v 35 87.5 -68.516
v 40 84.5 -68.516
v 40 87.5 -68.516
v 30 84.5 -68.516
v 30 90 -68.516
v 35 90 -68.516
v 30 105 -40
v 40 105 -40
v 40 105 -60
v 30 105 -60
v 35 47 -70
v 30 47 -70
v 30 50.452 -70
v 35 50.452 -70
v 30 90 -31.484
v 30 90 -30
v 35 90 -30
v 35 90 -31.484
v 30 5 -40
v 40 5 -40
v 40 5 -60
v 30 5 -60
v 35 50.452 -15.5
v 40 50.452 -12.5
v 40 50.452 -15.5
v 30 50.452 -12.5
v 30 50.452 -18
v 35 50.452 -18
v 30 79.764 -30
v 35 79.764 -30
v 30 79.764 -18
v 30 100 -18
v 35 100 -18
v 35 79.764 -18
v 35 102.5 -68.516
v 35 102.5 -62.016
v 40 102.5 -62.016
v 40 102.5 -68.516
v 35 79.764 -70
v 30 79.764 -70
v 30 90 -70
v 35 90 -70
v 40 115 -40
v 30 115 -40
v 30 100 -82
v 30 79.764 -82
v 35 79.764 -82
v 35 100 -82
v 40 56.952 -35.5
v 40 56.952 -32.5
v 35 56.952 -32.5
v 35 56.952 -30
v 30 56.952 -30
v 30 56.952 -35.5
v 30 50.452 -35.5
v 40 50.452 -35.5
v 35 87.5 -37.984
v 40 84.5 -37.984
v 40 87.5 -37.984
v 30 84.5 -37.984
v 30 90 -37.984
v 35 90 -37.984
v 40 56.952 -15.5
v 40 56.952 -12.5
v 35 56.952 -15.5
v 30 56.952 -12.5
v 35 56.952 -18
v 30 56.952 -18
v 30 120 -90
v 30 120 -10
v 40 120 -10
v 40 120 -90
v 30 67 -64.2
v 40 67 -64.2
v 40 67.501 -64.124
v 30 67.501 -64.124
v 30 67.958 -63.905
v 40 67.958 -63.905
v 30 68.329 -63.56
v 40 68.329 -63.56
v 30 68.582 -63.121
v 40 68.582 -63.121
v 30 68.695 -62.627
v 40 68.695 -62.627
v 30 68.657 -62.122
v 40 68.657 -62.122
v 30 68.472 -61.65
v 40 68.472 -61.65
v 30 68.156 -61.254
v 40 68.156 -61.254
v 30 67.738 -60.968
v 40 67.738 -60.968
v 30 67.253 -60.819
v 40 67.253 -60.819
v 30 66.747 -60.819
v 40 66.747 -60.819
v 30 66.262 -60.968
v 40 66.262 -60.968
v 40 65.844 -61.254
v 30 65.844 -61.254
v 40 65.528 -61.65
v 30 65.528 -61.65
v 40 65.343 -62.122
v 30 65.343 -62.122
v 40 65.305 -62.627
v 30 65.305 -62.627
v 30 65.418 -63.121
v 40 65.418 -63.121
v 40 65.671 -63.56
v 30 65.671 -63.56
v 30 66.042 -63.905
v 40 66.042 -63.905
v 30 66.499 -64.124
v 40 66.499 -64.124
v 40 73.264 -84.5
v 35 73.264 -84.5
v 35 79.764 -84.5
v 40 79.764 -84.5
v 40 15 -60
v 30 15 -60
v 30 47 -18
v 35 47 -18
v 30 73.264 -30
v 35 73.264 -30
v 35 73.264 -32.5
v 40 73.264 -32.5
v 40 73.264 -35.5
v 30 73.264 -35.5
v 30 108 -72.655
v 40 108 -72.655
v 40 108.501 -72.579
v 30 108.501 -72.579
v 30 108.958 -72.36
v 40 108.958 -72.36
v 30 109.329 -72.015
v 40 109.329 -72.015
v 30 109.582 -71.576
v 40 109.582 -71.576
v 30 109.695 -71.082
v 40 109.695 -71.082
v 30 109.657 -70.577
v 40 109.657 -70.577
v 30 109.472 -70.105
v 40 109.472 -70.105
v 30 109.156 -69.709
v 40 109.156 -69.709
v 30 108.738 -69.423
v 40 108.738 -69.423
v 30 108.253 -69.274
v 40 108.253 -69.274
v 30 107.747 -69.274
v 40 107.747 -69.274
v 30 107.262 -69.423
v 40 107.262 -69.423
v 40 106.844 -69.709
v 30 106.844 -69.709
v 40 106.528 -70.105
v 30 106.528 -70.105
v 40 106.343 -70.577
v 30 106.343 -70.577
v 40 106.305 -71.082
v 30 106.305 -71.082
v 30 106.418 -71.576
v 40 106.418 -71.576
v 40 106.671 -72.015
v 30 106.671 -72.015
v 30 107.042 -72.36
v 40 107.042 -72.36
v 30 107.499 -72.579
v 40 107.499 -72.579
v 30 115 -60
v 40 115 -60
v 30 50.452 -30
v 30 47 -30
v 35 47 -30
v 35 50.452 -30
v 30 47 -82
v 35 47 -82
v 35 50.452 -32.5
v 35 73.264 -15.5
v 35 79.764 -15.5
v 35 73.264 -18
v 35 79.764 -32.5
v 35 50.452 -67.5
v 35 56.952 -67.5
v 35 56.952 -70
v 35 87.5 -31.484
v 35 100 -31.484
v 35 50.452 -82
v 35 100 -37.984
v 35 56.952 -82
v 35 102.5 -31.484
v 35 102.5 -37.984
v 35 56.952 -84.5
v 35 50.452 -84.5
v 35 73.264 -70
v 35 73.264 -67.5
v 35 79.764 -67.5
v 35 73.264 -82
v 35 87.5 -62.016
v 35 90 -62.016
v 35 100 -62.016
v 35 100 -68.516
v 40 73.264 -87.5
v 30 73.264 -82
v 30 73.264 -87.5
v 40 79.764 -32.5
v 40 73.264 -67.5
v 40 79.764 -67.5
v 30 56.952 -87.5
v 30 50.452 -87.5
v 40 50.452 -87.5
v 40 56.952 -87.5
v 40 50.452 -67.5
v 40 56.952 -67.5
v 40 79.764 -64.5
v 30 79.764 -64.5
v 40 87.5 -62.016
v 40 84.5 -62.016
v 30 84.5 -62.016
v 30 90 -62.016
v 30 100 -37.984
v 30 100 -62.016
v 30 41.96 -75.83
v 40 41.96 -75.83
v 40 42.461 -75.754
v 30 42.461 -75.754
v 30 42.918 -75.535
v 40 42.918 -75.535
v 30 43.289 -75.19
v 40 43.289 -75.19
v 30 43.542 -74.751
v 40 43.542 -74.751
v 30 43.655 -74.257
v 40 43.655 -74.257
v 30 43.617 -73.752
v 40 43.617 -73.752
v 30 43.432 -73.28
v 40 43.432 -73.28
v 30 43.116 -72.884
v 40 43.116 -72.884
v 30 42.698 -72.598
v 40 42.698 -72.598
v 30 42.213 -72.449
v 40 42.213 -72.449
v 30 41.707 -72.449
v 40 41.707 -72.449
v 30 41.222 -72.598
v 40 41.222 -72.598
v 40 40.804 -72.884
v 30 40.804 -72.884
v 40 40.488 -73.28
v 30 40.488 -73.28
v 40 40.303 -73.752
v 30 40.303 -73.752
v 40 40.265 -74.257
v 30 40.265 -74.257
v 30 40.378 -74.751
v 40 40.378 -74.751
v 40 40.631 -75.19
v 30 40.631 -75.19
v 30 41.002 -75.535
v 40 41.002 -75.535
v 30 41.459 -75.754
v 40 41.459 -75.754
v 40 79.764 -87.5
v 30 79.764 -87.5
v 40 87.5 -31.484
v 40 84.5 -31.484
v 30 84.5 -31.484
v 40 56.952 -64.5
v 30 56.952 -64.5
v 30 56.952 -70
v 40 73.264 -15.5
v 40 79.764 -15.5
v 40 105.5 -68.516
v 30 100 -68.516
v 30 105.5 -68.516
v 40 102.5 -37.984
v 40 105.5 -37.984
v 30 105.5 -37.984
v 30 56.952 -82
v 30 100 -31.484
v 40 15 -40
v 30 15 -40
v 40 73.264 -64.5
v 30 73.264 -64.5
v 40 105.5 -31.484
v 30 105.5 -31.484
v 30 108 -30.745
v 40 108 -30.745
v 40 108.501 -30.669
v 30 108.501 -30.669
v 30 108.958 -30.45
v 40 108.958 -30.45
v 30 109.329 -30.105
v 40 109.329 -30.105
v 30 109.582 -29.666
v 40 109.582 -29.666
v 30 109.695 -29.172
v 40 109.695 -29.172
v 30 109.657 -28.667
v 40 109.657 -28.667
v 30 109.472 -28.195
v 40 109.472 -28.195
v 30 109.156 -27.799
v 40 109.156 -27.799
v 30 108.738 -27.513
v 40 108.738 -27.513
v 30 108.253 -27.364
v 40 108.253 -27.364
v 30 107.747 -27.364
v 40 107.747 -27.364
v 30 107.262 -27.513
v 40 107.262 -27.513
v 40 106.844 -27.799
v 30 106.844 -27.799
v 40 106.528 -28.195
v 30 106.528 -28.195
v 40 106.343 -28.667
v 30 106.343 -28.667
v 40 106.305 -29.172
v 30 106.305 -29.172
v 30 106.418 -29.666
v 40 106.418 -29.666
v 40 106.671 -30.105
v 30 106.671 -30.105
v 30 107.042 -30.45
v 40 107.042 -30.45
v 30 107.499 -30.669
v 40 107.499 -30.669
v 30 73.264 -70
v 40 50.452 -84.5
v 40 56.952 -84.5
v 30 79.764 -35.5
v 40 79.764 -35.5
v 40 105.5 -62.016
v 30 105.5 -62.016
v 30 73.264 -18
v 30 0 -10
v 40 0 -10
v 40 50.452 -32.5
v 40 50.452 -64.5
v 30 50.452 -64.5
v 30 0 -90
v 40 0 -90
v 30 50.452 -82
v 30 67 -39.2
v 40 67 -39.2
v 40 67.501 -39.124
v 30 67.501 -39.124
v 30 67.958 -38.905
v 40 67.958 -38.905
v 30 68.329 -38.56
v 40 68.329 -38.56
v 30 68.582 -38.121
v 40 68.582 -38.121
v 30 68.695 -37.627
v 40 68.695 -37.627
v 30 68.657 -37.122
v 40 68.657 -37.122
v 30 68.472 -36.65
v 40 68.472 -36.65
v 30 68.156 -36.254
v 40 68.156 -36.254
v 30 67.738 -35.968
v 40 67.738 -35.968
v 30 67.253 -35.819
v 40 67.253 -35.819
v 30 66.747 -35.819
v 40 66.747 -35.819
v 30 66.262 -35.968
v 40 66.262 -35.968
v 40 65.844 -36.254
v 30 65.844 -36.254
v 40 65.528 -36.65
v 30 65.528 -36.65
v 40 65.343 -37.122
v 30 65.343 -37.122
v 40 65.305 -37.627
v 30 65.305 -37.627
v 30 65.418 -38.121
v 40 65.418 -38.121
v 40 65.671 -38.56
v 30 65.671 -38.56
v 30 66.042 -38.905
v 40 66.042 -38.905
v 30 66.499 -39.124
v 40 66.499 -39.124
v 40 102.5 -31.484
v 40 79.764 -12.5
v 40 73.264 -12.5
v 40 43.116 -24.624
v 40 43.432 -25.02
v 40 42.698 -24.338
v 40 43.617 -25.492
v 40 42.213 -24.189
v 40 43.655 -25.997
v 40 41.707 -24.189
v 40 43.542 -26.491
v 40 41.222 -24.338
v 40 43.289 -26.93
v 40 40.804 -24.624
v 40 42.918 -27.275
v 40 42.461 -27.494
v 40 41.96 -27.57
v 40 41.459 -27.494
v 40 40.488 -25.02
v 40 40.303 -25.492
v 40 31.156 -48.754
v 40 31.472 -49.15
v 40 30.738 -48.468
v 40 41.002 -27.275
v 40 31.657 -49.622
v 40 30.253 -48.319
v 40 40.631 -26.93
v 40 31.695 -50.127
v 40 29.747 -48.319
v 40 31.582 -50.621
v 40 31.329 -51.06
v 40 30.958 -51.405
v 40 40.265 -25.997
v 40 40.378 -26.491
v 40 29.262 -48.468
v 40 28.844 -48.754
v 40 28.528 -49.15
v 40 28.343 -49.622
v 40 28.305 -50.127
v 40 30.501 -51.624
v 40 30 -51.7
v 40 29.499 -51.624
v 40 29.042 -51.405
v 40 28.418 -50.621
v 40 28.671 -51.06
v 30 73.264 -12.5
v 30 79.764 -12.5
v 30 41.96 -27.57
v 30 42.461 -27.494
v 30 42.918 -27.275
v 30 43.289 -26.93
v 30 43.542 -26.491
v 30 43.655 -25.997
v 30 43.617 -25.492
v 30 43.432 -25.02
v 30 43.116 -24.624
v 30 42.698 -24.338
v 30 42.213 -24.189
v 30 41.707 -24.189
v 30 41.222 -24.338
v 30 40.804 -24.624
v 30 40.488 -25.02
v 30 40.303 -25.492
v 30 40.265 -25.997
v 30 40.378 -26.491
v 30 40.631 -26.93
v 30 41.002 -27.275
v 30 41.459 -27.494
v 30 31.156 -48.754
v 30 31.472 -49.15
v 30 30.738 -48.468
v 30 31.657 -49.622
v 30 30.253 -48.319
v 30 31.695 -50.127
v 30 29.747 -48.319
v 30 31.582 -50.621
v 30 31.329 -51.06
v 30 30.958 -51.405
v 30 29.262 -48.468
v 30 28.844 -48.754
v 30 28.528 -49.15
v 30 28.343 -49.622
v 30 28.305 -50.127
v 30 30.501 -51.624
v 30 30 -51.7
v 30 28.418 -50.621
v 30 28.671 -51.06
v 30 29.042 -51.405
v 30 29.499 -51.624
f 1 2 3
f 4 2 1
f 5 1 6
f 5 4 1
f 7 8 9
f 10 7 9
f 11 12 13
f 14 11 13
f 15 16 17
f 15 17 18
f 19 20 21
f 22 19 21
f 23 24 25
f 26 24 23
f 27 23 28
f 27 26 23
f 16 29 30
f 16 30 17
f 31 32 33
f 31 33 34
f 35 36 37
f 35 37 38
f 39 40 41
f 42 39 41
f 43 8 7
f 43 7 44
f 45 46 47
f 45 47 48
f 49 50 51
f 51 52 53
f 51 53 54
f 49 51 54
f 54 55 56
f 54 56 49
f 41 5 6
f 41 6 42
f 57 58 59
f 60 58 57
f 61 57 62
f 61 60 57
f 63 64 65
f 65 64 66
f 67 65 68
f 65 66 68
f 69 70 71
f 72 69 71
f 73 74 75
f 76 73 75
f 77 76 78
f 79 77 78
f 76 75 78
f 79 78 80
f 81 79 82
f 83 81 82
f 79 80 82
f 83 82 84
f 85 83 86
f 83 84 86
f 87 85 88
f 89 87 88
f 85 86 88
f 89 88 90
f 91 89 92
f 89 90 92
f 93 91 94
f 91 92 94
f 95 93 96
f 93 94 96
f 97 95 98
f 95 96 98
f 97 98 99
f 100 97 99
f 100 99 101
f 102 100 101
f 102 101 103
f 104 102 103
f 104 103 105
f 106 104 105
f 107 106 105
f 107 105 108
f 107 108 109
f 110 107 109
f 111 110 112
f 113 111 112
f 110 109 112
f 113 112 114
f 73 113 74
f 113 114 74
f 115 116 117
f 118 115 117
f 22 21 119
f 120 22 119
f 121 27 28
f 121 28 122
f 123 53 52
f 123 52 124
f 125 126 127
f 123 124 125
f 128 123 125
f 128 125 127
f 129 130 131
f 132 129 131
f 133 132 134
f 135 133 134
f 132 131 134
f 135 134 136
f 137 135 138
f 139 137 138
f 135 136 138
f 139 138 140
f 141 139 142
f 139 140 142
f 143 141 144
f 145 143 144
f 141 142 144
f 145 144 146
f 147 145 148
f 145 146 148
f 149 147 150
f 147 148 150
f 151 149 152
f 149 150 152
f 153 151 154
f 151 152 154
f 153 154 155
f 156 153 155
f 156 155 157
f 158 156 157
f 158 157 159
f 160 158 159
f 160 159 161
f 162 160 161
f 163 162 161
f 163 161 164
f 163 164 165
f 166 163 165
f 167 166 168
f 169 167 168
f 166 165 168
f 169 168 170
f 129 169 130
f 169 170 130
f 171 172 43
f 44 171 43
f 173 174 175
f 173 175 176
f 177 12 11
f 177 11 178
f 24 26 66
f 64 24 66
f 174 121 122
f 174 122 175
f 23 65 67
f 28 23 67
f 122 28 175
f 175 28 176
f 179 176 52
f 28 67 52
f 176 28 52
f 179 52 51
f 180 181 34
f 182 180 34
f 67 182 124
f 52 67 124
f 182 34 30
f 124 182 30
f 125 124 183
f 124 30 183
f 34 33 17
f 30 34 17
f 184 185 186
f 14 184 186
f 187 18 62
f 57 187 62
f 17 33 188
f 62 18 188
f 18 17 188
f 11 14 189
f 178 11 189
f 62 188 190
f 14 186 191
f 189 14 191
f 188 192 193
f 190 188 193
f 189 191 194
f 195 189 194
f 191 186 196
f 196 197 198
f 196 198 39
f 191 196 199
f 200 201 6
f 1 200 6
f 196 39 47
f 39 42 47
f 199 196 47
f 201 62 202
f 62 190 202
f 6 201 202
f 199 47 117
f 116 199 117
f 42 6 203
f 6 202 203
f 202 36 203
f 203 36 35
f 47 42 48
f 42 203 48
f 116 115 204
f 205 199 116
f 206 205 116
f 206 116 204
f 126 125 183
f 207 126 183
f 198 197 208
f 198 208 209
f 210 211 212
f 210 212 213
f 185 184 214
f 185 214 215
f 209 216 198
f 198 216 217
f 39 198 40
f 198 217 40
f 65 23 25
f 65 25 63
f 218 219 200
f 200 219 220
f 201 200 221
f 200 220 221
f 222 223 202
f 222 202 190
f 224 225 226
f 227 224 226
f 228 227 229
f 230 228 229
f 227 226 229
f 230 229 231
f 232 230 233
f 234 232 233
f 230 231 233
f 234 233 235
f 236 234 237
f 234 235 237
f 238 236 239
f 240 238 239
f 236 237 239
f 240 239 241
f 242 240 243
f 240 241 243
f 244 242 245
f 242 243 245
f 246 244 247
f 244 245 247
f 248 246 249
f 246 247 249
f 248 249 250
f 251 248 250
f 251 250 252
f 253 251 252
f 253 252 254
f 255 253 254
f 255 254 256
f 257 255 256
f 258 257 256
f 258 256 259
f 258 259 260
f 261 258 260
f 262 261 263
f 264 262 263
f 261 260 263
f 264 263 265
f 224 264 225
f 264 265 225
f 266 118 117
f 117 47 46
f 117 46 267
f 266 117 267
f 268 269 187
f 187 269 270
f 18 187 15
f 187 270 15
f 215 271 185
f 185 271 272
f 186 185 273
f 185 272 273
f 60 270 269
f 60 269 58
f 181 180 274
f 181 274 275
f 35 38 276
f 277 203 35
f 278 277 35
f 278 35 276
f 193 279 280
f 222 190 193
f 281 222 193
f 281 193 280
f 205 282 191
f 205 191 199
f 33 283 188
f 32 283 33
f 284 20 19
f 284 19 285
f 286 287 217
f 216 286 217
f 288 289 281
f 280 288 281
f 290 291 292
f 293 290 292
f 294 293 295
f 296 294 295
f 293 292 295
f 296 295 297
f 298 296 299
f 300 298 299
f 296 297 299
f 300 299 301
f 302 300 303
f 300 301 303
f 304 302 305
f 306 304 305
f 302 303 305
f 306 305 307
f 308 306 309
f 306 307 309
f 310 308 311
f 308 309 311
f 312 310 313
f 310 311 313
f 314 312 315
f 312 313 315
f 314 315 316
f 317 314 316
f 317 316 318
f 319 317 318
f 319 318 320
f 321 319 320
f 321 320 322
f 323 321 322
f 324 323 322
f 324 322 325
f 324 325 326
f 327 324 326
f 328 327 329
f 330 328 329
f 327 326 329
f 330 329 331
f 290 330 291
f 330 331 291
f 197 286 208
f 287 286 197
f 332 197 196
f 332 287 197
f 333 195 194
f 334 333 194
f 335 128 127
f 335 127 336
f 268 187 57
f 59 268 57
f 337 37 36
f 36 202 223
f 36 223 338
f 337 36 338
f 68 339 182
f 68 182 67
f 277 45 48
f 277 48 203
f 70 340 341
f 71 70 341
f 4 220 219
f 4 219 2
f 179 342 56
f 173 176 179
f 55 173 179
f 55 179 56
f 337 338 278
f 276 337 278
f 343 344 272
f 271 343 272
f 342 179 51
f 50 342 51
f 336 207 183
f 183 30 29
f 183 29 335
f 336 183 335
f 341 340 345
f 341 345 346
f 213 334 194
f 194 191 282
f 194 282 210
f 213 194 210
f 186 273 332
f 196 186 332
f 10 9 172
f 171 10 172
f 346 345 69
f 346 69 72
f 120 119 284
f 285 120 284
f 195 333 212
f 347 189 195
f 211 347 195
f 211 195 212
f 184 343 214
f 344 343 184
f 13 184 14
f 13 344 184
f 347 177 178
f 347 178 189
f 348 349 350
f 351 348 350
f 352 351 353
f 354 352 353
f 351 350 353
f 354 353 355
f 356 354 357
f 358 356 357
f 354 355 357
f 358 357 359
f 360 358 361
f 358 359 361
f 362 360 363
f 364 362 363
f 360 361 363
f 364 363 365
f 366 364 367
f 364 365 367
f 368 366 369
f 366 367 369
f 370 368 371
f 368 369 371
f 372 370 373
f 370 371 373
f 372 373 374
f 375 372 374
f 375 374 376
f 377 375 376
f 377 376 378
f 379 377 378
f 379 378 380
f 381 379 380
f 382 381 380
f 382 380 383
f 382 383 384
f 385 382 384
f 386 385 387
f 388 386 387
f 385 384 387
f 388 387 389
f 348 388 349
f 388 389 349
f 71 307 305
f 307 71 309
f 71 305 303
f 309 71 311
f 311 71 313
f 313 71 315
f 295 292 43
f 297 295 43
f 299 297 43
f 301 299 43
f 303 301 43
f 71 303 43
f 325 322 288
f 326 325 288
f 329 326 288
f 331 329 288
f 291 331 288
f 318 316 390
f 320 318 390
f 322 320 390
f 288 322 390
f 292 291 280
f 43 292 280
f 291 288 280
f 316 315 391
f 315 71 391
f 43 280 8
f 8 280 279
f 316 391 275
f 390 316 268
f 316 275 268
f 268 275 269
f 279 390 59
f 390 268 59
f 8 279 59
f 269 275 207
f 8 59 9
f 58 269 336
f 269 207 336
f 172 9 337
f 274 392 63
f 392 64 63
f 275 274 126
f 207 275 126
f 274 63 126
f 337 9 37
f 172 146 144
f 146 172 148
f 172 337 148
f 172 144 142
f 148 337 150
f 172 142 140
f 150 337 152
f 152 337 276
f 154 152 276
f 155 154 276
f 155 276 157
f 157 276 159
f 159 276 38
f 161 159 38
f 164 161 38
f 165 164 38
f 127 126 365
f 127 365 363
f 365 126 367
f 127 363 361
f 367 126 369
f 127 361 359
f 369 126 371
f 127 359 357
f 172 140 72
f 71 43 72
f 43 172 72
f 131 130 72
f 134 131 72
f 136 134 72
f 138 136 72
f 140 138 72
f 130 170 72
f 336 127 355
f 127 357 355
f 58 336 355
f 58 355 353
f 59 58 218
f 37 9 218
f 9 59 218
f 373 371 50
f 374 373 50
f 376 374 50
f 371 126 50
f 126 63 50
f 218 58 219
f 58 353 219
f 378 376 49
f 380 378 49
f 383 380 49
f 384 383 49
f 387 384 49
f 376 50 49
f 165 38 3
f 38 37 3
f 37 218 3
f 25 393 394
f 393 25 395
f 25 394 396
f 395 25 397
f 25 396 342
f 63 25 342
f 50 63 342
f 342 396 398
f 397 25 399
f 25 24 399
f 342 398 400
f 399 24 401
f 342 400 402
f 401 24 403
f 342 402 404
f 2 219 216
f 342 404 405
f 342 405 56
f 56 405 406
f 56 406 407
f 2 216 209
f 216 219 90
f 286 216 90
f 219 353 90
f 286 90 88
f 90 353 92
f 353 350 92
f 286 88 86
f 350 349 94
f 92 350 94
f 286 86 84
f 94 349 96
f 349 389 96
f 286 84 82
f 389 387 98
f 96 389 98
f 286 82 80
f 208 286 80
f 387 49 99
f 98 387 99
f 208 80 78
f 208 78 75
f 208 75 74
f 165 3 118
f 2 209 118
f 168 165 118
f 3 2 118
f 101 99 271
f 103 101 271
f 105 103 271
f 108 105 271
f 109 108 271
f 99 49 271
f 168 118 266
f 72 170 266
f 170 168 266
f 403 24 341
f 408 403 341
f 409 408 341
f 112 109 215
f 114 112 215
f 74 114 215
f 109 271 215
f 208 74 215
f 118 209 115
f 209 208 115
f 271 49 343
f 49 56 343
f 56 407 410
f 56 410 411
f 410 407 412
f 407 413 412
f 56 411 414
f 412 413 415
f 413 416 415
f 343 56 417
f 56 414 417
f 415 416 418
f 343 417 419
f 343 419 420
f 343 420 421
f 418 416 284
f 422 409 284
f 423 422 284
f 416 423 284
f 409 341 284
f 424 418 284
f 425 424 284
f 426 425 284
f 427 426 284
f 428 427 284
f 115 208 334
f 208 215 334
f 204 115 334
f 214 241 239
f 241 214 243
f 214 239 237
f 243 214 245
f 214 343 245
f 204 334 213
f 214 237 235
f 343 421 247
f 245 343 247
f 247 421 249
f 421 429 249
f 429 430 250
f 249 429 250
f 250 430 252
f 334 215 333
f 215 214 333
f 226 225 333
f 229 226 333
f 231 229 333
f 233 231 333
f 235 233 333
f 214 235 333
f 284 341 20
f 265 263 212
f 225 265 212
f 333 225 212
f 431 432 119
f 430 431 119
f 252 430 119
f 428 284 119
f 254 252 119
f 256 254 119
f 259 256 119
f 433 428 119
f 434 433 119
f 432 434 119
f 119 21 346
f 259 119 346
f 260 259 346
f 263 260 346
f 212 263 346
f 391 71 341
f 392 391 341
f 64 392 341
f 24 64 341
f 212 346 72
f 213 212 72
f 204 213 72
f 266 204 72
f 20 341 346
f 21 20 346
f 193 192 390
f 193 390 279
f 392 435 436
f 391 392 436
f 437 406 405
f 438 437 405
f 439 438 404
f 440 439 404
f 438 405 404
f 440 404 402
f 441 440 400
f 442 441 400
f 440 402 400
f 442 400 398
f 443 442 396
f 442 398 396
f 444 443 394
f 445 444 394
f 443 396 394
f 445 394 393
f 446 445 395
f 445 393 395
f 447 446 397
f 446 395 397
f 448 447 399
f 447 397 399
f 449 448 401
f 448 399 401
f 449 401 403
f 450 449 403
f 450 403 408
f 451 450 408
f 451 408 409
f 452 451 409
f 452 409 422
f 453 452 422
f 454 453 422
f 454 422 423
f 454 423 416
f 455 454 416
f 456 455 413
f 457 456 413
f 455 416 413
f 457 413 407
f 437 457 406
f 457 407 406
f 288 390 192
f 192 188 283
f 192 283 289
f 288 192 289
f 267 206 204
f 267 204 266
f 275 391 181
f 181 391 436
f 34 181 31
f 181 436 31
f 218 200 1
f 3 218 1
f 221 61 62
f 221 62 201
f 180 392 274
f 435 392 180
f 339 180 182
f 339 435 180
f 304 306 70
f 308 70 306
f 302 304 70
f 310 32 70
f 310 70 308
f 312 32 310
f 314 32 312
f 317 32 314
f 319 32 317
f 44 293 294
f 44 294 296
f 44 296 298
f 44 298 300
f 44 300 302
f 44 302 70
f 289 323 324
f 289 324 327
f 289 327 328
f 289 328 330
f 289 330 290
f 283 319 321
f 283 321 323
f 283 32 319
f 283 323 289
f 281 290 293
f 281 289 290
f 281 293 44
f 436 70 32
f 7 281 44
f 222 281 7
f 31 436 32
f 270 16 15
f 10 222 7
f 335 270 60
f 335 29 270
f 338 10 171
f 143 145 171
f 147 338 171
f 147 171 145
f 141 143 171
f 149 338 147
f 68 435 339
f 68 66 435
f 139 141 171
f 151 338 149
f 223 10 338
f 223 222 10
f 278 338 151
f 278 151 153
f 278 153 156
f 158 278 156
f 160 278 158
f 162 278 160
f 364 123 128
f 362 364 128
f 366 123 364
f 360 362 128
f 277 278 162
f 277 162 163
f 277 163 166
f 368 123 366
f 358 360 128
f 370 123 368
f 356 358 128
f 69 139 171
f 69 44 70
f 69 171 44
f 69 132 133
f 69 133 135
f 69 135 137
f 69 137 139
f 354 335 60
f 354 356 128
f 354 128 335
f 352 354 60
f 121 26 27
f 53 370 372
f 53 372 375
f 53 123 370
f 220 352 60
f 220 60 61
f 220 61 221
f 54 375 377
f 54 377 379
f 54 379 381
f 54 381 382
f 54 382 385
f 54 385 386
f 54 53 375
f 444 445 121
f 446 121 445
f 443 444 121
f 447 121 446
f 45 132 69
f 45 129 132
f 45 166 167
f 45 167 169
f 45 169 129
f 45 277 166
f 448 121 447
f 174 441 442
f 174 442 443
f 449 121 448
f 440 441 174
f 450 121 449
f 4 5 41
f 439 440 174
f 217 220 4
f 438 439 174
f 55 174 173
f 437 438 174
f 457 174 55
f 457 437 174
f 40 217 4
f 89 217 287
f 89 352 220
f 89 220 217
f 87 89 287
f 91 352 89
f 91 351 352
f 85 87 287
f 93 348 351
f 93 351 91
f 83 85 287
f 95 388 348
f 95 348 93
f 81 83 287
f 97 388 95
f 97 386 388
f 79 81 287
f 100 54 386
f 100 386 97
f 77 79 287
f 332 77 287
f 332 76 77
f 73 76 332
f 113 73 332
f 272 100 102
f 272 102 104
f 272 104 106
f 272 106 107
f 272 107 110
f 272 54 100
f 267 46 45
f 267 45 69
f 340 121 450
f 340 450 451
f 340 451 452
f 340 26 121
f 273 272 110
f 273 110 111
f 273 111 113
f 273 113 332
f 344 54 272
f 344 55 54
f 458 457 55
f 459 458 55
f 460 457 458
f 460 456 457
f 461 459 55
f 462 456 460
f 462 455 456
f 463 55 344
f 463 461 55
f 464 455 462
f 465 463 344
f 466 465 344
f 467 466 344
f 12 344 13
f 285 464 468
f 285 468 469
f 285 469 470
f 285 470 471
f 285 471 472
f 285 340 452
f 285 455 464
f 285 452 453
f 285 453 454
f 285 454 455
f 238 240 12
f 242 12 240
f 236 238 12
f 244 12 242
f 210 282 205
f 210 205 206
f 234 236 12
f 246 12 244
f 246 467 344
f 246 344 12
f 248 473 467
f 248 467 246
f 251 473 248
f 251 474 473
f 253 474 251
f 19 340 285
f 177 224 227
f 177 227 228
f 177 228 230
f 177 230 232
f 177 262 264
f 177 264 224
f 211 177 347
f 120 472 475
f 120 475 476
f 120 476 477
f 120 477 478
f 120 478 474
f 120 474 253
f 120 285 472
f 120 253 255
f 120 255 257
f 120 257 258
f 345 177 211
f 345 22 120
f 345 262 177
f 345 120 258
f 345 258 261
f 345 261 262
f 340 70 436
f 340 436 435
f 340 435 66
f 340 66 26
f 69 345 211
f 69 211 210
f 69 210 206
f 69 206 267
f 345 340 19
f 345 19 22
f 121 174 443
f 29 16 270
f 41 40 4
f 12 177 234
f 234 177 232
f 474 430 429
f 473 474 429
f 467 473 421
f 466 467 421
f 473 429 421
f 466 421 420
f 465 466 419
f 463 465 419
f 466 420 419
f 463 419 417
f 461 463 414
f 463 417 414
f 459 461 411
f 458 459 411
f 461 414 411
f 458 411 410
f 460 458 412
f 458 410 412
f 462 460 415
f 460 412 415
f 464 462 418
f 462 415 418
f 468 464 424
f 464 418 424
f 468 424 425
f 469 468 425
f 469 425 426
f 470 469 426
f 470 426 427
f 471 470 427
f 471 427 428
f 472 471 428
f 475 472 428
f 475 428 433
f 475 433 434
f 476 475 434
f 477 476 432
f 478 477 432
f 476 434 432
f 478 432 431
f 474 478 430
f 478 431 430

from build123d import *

# Parameters (mm, degrees)
SKETCH3_W                = 100
SKETCH3_H                = 100
SKETCH3_W_2              = 80
SKETCH3_H_2              = 80
BOSS_EXTRUDE1_DEPTH      = 120
CUT_EXTRUDE6_DEPTH       = 186.47236991
CIRPATTERN1_COUNT        = 2
CIRPATTERN1_ANGLE        = 90
SKETCH19_R               = 13.375
SKETCH19_R_2             = 8.4375
BOSS_EXTRUDE3_DEPTH      = 10
BOSS_EXTRUDE4_START      = -110
SKETCH19_2_R             = 13.375
SKETCH19_2_R_2           = 8.4375
BOSS_EXTRUDE4_DEPTH      = 10
CUT_EXTRUDE4_DEPTH       = 186.47236991
CUT_EXTRUDE4_DEPTH_BACK  = 186.47236991
SKETCH8_R                = 8.4375
CUT_EXTRUDE11_START      = 120
SKETCH21_R               = 1.5
CUT_EXTRUDE11_DEPTH      = 10
CUT_EXTRUDE12_START      = 10
SKETCH21_2_R             = 1.5
CUT_EXTRUDE12_DEPTH      = 10
SKETCH9_W                = 10
SKETCH9_H                = 80
ELECTRONICSPLATE_DEPTH   = 120
CUT_EXTRUDE10_REACH      = 187.472
SKETCH18_W               = 80
SKETCH18_H               = 100
BEAGLEBONEHOLES_START    = 40
SKETCH12_R               = 1.7
BEAGLEBONEHOLES_DEPTH    = 10
RFDHOLES_START           = 40
SKETCH13_R               = 1.7
RFDHOLES_DEPTH           = 10
ANTENNACAVITY_START      = 30
SKETCH35_W               = 12
SKETCH35_H               = 43
ANTENNACAVITY_DEPTH      = 5
ZIPTIEHOLES_START        = 30
SKETCH36_W               = 3
SKETCH36_H               = 6.5
SKETCH36_W_2             = 6.5
SKETCH36_H_2             = 3
ZIPTIEHOLES_DEPTH        = 10
CUT_EXTRUDE16_START      = 30
SKETCH36_3_W             = 17
SKETCH36_3_H             = 6.5
SKETCH36_3_W_2           = 6.5
SKETCH36_3_H_2           = 15
CUT_EXTRUDE16_DEPTH      = 5
WIREHOLES_START          = 40
SKETCH37_W               = 10
SKETCH37_H               = 10
WIREHOLES_DEPTH          = 10
CUT_EXTRUDE17_DEPTH      = 186.47236991
CUT_EXTRUDE17_DEPTH_BACK = 186.47236991
SKETCH39_W               = 30
SKETCH39_H               = 100
SKETCH39_W_2             = 60
SKETCH39_W_3             = 10
SKETCH39_H_2             = 10


with BuildPart() as part:
    # Sketch3 → Boss-Extrude1 (new body)
    with BuildSketch(Plane(origin=(0, 0, 0), x_dir=(1, 0, 0), z_dir=(0, 1, 0))):
        with Locations((50, 50)):
            Rectangle(SKETCH3_W, SKETCH3_H)
        with Locations((50, 50)):
            Rectangle(SKETCH3_W_2, SKETCH3_H_2, mode=Mode.SUBTRACT)
    extrude(amount=BOSS_EXTRUDE1_DEPTH)

    # Sketch6 → Cut-Extrude6 (cut, symmetric)
    with BuildSketch(Plane.XY):
        Polygon((14.84187473, 110), (50, 67.810249676), (85.15812527, 110), align=None)
        Polygon((56.508541397, 60), (90, 100.189750324), (90, 19.810249676), align=None)
        Polygon((14.84187473, 10), (50, 52.189750324), (85.15812527, 10), align=None)
        Polygon((10, 19.810249676), (43.491458603, 60), (10, 100.189750324), align=None)
    cut_extrude6 = extrude(amount=CUT_EXTRUDE6_DEPTH, both=True, mode=Mode.SUBTRACT)

    # CirPattern1: Cut-Extrude6 ×2 about axis
    cirpattern1_axis = Axis((50, 0, -50), (0, 1, 0))
    for i in range(1, CIRPATTERN1_COUNT):
        add(cut_extrude6.rotate(cirpattern1_axis, i * CIRPATTERN1_ANGLE / (CIRPATTERN1_COUNT - 1)), mode=Mode.SUBTRACT)

    # Sketch19 → Boss-Extrude3 (add)
    # profile 1 of 4: a face of its own
    with BuildSketch(Plane(origin=(0, 120, 0), x_dir=(1, 0, 0), z_dir=(0, 1, 0))):
        with Locations((13.375, 86.625)):
            Circle(SKETCH19_R)
        with Locations((13.375, 86.625)):
            Circle(SKETCH19_R_2, mode=Mode.SUBTRACT)
    # profile 2 of 4: a face of its own
    with BuildSketch(Plane(origin=(0, 120, 0), x_dir=(1, 0, 0), z_dir=(0, 1, 0))):
        with Locations((86.625, 86.625)):
            Circle(SKETCH19_R)
        with Locations((86.625, 86.625)):
            Circle(SKETCH19_R_2, mode=Mode.SUBTRACT)
    # profile 3 of 4: a face of its own
    with BuildSketch(Plane(origin=(0, 120, 0), x_dir=(1, 0, 0), z_dir=(0, 1, 0))):
        with Locations((86.625, 13.375)):
            Circle(SKETCH19_R)
        with Locations((86.625, 13.375)):
            Circle(SKETCH19_R_2, mode=Mode.SUBTRACT)
    # profile 4 of 4: a face of its own
    with BuildSketch(Plane(origin=(0, 120, 0), x_dir=(1, 0, 0), z_dir=(0, 1, 0))):
        with Locations((13.375, 13.375)):
            Circle(SKETCH19_R)
        with Locations((13.375, 13.375)):
            Circle(SKETCH19_R_2, mode=Mode.SUBTRACT)
    extrude(amount=-BOSS_EXTRUDE3_DEPTH)

    # Sketch19<2> → Boss-Extrude4 (add)
    # profile 1 of 4: a face of its own
    with BuildSketch(Plane(origin=(0, 120, 0), x_dir=(1, 0, 0), z_dir=(0, 1, 0)).offset(BOSS_EXTRUDE4_START)):
        with Locations((13.375, 86.625)):
            Circle(SKETCH19_2_R)
    # profile 2 of 4: a face of its own
    with BuildSketch(Plane(origin=(0, 120, 0), x_dir=(1, 0, 0), z_dir=(0, 1, 0)).offset(BOSS_EXTRUDE4_START)):
        with Locations((86.625, 86.625)):
            Circle(SKETCH19_2_R)
        with Locations((86.625, 86.625)):
            Circle(SKETCH19_2_R_2, mode=Mode.SUBTRACT)
    # profile 3 of 4: a face of its own
    with BuildSketch(Plane(origin=(0, 120, 0), x_dir=(1, 0, 0), z_dir=(0, 1, 0)).offset(BOSS_EXTRUDE4_START)):
        with Locations((86.625, 13.375)):
            Circle(SKETCH19_2_R)
        with Locations((86.625, 13.375)):
            Circle(SKETCH19_2_R_2, mode=Mode.SUBTRACT)
    # profile 4 of 4: a face of its own
    with BuildSketch(Plane(origin=(0, 120, 0), x_dir=(1, 0, 0), z_dir=(0, 1, 0)).offset(BOSS_EXTRUDE4_START)):
        with Locations((13.375, 13.375)):
            Circle(SKETCH19_2_R)
        with Locations((13.375, 13.375)):
            Circle(SKETCH19_2_R_2, mode=Mode.SUBTRACT)
    extrude(amount=-BOSS_EXTRUDE4_DEPTH)

    # Sketch8 → Cut-Extrude4 (cut, two sides: drawn at the far end of the back side and taken through both)
    with BuildSketch(Plane(origin=(0, 0, 0), x_dir=(1, 0, 0), z_dir=(0, 1, 0)).offset(-CUT_EXTRUDE4_DEPTH_BACK)):
        with Locations(Location((13.375, 86.625, 0), (0, 0, 90))):
            Circle(SKETCH8_R)
        with Locations(Location((86.625, 86.625, 0), (0, 0, 90))):
            Circle(SKETCH8_R)
        with Locations(Location((13.375, 13.375, 0), (0, 0, 90))):
            Circle(SKETCH8_R)
        with Locations(Location((86.625, 13.375, 0), (0, 0, 90))):
            Circle(SKETCH8_R)
    extrude(amount=CUT_EXTRUDE4_DEPTH + CUT_EXTRUDE4_DEPTH_BACK, mode=Mode.SUBTRACT)

    # Sketch21 → Cut-Extrude11 (cut)
    with BuildSketch(Plane(origin=(0, 0, 0), x_dir=(1, 0, 0), z_dir=(0, 1, 0)).offset(CUT_EXTRUDE11_START)):
        with Locations(Location((5, 50, 0), (0, 0, 270))):
            Circle(SKETCH21_R)
        with Locations(Location((50, 95, 0), (0, 0, 270))):
            Circle(SKETCH21_R)
        with Locations(Location((95, 50, 0), (0, 0, 270))):
            Circle(SKETCH21_R)
        with Locations(Location((50, 5, 0), (0, 0, 270))):
            Circle(SKETCH21_R)
    extrude(amount=-CUT_EXTRUDE11_DEPTH, mode=Mode.SUBTRACT)

    # Sketch21<2> → Cut-Extrude12 (cut)
    with BuildSketch(Plane(origin=(0, 0, 0), x_dir=(1, 0, 0), z_dir=(0, 1, 0)).offset(CUT_EXTRUDE12_START)):
        with Locations(Location((5, 50, 0), (0, 0, 270))):
            Circle(SKETCH21_2_R)
        with Locations(Location((50, 95, 0), (0, 0, 270))):
            Circle(SKETCH21_2_R)
        with Locations(Location((95, 50, 0), (0, 0, 270))):
            Circle(SKETCH21_2_R)
        with Locations(Location((50, 5, 0), (0, 0, 270))):
            Circle(SKETCH21_2_R)
    extrude(amount=-CUT_EXTRUDE12_DEPTH, mode=Mode.SUBTRACT)

    # Sketch9 → ElectronicsPlate (add)
    with BuildSketch(Plane(origin=(0, 0, 0), x_dir=(1, 0, 0), z_dir=(0, 1, 0))):
        with Locations((35, 50)):
            Rectangle(SKETCH9_W, SKETCH9_H)
    extrude(amount=ELECTRONICSPLATE_DEPTH)

    # Sketch18 → Cut-Extrude10 (cut, up to next)
    with BuildSketch(Plane.ZY, mode=Mode.PRIVATE) as cut_extrude10_sk1:
        with Locations((-50, 60)):
            Rectangle(SKETCH18_W, SKETCH18_H)
    cut_extrude10_tool1 = extrude(cut_extrude10_sk1.sketch, amount=-CUT_EXTRUDE10_REACH, mode=Mode.PRIVATE) & part.part
    add(cut_extrude10_tool1.solids().sort_by_distance((0, 60, -50))[0], mode=Mode.SUBTRACT)

    # Sketch12 → BeagleboneHoles (cut)
    with BuildSketch(Plane(origin=(0, 0, 0), x_dir=(0, 0, -1), z_dir=(1, 0, 0)).offset(BEAGLEBONEHOLES_START)):
        with Locations((25.87, 41.96)):
            Circle(SKETCH12_R)
        with Locations((74.13, 41.96)):
            Circle(SKETCH12_R)
        with Locations((29.045, 108)):
            Circle(SKETCH12_R)
        with Locations((70.955, 108)):
            Circle(SKETCH12_R)
    extrude(amount=-BEAGLEBONEHOLES_DEPTH, mode=Mode.SUBTRACT)

    # Sketch13 → RFDHoles (cut)
    with BuildSketch(Plane(origin=(0, 0, 0), x_dir=(0, 0, -1), z_dir=(1, 0, 0)).offset(RFDHOLES_START)):
        with Locations((50, 30)):
            Circle(SKETCH13_R)
        with Locations((37.5, 67)):
            Circle(SKETCH13_R)
        with Locations((62.5, 67)):
            Circle(SKETCH13_R)
    extrude(amount=-RFDHOLES_DEPTH, mode=Mode.SUBTRACT)

    # Sketch35 → AntennaCavity (cut)
    with BuildSketch(Plane(origin=(0, 0, 0), x_dir=(0, 0, -1), z_dir=(1, 0, 0)).offset(ANTENNACAVITY_START)):
        with Locations((24, 68.5)):
            Rectangle(SKETCH35_W, SKETCH35_H)
        Polygon((18, 90), (30, 90), (50, 90), (50, 100), (18, 100), align=None)
        Polygon((50, 100), (50, 90), (70, 90), (82, 90), (82, 100), align=None)
        with Locations((76, 68.5)):
            Rectangle(SKETCH35_W, SKETCH35_H)
    extrude(amount=ANTENNACAVITY_DEPTH, mode=Mode.SUBTRACT)

    # Sketch36 → ZiptieHoles (cut)
    with BuildSketch(Plane(origin=(0, 0, 0), x_dir=(0, 0, -1), z_dir=(1, 0, 0)).offset(ZIPTIEHOLES_START)):
        with Locations((34, 53.701837694)):
            Rectangle(SKETCH36_W, SKETCH36_H)
        with Locations((14, 53.701837694)):
            Rectangle(SKETCH36_W, SKETCH36_H)
        with Locations((34, 76.513807116)):
            Rectangle(SKETCH36_W, SKETCH36_H)
        with Locations((14, 76.513807116)):
            Rectangle(SKETCH36_W, SKETCH36_H)
        with Locations((34.734232458, 86)):
            Rectangle(SKETCH36_W_2, SKETCH36_H_2)
        with Locations((34.734232458, 104)):
            Rectangle(SKETCH36_W_2, SKETCH36_H_2)
        with Locations((65.265767542, 104)):
            Rectangle(SKETCH36_W_2, SKETCH36_H_2)
        with Locations((65.265767542, 86)):
            Rectangle(SKETCH36_W_2, SKETCH36_H_2)
        with Locations((66, 76.513807116)):
            Rectangle(SKETCH36_W, SKETCH36_H)
        with Locations((86, 76.513807116)):
            Rectangle(SKETCH36_W, SKETCH36_H)
        with Locations((86, 53.701837694)):
            Rectangle(SKETCH36_W, SKETCH36_H)
        with Locations((66, 53.701837694)):
            Rectangle(SKETCH36_W, SKETCH36_H)
    extrude(amount=ZIPTIEHOLES_DEPTH, mode=Mode.SUBTRACT)

    # Sketch36<3> → Cut-Extrude16 (cut)
    with BuildSketch(Plane(origin=(0, 0, 0), x_dir=(0, 0, -1), z_dir=(1, 0, 0)).offset(CUT_EXTRUDE16_START)):
        with Locations((24, 76.513807116)):
            Rectangle(SKETCH36_3_W, SKETCH36_3_H)
        with Locations((34.734232458, 95)):
            Rectangle(SKETCH36_3_W_2, SKETCH36_3_H_2)
        with Locations((65.265767542, 95)):
            Rectangle(SKETCH36_3_W_2, SKETCH36_3_H_2)
        with Locations((76, 76.513807116)):
            Rectangle(SKETCH36_3_W, SKETCH36_3_H)
        with Locations((76, 53.701837694)):
            Rectangle(SKETCH36_3_W, SKETCH36_3_H)
        with Locations((24, 53.701837694)):
            Rectangle(SKETCH36_3_W, SKETCH36_3_H)
    extrude(amount=CUT_EXTRUDE16_DEPTH, mode=Mode.SUBTRACT)

    # Sketch37 → WireHoles (cut)
    with BuildSketch(Plane(origin=(0, 0, 0), x_dir=(0, 0, -1), z_dir=(1, 0, 0)).offset(WIREHOLES_START)):
        with Locations((45, 10)):
            Rectangle(SKETCH37_W, SKETCH37_H)
        with Locations((55, 10)):
            Rectangle(SKETCH37_W, SKETCH37_H)
        with Locations((55, 110)):
            Rectangle(SKETCH37_W, SKETCH37_H)
        with Locations((45, 110)):
            Rectangle(SKETCH37_W, SKETCH37_H)
    extrude(amount=-WIREHOLES_DEPTH, mode=Mode.SUBTRACT)

    # Sketch39 → Cut-Extrude17 (cut, two sides: drawn at the far end of the back side and taken through both)
    with BuildSketch(Plane(origin=(0, 0, 0), x_dir=(1, 0, 0), z_dir=(0, 1, 0)).offset(-CUT_EXTRUDE17_DEPTH_BACK)):
        with Locations((15, 50)):
            Rectangle(SKETCH39_W, SKETCH39_H)
        with Locations((70, 50)):
            Rectangle(SKETCH39_W_2, SKETCH39_H)
        with Locations((35, 95)):
            Rectangle(SKETCH39_W_3, SKETCH39_H_2)
        with Locations((35, 5)):
            Rectangle(SKETCH39_W_3, SKETCH39_H_2)
    extrude(amount=CUT_EXTRUDE17_DEPTH + CUT_EXTRUDE17_DEPTH_BACK, mode=Mode.SUBTRACT)


solid = part.part
